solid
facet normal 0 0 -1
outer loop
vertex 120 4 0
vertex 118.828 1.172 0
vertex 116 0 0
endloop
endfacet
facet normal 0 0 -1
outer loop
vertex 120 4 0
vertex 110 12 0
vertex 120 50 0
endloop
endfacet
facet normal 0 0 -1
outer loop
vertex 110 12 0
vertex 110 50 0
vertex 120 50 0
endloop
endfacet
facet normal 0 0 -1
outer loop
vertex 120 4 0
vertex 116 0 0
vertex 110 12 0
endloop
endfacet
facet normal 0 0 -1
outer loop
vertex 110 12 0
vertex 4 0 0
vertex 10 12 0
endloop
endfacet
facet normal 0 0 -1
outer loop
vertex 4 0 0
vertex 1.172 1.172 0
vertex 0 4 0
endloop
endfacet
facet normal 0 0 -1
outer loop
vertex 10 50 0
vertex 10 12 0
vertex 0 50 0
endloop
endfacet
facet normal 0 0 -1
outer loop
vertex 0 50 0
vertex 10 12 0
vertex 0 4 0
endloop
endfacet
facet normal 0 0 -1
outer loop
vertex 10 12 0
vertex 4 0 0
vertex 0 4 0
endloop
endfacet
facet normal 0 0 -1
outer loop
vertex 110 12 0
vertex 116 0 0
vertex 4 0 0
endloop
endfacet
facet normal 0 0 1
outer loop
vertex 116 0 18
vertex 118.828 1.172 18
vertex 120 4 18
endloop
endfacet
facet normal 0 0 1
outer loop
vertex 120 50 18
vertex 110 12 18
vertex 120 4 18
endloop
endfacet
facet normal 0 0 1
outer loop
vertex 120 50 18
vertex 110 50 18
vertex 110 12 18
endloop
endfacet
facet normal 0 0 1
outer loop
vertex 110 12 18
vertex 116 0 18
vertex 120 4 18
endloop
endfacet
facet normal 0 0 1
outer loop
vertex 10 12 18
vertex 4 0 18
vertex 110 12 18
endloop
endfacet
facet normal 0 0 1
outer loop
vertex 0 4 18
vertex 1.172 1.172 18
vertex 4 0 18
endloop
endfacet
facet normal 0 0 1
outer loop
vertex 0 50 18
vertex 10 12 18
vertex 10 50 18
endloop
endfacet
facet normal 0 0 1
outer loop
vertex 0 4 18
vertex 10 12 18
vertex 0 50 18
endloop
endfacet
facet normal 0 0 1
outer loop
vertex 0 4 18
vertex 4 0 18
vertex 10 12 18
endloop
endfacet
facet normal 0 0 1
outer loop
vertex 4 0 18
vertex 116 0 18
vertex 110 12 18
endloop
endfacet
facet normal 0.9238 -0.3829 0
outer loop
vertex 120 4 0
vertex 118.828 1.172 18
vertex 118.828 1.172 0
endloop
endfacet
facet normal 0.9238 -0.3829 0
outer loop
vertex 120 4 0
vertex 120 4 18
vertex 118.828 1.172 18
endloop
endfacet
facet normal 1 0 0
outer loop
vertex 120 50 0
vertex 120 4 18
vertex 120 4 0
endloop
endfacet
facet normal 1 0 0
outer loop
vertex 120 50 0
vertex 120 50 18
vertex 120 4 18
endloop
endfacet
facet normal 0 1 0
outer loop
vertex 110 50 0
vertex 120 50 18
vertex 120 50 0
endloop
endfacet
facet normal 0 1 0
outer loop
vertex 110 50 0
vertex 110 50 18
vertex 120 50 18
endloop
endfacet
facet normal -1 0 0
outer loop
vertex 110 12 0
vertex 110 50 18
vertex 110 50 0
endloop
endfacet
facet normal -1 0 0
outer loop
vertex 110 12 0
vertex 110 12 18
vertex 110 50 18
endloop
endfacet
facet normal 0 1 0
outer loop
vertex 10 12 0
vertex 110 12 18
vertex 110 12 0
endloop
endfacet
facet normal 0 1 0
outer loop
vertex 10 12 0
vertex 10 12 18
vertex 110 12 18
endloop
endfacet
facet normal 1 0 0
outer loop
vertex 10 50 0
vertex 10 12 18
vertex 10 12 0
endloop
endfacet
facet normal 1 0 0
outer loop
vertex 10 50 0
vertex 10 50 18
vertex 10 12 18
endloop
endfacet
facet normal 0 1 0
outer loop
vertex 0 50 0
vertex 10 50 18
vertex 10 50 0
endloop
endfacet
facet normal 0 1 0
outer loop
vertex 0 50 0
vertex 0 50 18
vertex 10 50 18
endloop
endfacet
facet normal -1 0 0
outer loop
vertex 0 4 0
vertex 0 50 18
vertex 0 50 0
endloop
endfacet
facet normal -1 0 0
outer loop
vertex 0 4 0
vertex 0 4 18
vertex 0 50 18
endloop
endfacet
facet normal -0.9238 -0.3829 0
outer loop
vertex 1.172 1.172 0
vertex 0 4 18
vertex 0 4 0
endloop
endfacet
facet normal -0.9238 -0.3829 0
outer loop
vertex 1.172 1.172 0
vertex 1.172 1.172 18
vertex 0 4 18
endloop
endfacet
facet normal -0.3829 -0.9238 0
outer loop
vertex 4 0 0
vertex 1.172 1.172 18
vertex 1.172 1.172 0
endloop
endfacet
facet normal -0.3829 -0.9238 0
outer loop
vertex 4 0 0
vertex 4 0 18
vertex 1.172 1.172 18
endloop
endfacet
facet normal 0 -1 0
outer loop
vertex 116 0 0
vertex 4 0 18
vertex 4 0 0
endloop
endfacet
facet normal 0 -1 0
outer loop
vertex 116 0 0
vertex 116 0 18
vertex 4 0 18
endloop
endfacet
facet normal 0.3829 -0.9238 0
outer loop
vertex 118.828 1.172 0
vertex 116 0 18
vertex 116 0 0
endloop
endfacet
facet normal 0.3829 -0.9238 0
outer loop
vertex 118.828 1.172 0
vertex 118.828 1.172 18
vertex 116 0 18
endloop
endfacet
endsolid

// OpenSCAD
$fn = 32;

// ----------------------------------------------------------------------
// Heat sink frame: 120 x 50 mm frame, 10 mm walls
// ----------------------------------------------------------------------

// --- parameters (mm) ---
profile_height = 18;      // extrusion height
profile_points = 12;      // points of the closed outline

profile = [[0, 4], [1.172, 1.172], [4, 0], [116, 0], [118.828, 1.172], [120, 4], [120, 50], [110, 50], [110, 12], [10, 12], [10, 50], [0, 50]];  // single closed polygon, 12 points, counter clockwise

// --- the one profile operation ---
linear_extrude(height = profile_height) polygon(points = profile);
